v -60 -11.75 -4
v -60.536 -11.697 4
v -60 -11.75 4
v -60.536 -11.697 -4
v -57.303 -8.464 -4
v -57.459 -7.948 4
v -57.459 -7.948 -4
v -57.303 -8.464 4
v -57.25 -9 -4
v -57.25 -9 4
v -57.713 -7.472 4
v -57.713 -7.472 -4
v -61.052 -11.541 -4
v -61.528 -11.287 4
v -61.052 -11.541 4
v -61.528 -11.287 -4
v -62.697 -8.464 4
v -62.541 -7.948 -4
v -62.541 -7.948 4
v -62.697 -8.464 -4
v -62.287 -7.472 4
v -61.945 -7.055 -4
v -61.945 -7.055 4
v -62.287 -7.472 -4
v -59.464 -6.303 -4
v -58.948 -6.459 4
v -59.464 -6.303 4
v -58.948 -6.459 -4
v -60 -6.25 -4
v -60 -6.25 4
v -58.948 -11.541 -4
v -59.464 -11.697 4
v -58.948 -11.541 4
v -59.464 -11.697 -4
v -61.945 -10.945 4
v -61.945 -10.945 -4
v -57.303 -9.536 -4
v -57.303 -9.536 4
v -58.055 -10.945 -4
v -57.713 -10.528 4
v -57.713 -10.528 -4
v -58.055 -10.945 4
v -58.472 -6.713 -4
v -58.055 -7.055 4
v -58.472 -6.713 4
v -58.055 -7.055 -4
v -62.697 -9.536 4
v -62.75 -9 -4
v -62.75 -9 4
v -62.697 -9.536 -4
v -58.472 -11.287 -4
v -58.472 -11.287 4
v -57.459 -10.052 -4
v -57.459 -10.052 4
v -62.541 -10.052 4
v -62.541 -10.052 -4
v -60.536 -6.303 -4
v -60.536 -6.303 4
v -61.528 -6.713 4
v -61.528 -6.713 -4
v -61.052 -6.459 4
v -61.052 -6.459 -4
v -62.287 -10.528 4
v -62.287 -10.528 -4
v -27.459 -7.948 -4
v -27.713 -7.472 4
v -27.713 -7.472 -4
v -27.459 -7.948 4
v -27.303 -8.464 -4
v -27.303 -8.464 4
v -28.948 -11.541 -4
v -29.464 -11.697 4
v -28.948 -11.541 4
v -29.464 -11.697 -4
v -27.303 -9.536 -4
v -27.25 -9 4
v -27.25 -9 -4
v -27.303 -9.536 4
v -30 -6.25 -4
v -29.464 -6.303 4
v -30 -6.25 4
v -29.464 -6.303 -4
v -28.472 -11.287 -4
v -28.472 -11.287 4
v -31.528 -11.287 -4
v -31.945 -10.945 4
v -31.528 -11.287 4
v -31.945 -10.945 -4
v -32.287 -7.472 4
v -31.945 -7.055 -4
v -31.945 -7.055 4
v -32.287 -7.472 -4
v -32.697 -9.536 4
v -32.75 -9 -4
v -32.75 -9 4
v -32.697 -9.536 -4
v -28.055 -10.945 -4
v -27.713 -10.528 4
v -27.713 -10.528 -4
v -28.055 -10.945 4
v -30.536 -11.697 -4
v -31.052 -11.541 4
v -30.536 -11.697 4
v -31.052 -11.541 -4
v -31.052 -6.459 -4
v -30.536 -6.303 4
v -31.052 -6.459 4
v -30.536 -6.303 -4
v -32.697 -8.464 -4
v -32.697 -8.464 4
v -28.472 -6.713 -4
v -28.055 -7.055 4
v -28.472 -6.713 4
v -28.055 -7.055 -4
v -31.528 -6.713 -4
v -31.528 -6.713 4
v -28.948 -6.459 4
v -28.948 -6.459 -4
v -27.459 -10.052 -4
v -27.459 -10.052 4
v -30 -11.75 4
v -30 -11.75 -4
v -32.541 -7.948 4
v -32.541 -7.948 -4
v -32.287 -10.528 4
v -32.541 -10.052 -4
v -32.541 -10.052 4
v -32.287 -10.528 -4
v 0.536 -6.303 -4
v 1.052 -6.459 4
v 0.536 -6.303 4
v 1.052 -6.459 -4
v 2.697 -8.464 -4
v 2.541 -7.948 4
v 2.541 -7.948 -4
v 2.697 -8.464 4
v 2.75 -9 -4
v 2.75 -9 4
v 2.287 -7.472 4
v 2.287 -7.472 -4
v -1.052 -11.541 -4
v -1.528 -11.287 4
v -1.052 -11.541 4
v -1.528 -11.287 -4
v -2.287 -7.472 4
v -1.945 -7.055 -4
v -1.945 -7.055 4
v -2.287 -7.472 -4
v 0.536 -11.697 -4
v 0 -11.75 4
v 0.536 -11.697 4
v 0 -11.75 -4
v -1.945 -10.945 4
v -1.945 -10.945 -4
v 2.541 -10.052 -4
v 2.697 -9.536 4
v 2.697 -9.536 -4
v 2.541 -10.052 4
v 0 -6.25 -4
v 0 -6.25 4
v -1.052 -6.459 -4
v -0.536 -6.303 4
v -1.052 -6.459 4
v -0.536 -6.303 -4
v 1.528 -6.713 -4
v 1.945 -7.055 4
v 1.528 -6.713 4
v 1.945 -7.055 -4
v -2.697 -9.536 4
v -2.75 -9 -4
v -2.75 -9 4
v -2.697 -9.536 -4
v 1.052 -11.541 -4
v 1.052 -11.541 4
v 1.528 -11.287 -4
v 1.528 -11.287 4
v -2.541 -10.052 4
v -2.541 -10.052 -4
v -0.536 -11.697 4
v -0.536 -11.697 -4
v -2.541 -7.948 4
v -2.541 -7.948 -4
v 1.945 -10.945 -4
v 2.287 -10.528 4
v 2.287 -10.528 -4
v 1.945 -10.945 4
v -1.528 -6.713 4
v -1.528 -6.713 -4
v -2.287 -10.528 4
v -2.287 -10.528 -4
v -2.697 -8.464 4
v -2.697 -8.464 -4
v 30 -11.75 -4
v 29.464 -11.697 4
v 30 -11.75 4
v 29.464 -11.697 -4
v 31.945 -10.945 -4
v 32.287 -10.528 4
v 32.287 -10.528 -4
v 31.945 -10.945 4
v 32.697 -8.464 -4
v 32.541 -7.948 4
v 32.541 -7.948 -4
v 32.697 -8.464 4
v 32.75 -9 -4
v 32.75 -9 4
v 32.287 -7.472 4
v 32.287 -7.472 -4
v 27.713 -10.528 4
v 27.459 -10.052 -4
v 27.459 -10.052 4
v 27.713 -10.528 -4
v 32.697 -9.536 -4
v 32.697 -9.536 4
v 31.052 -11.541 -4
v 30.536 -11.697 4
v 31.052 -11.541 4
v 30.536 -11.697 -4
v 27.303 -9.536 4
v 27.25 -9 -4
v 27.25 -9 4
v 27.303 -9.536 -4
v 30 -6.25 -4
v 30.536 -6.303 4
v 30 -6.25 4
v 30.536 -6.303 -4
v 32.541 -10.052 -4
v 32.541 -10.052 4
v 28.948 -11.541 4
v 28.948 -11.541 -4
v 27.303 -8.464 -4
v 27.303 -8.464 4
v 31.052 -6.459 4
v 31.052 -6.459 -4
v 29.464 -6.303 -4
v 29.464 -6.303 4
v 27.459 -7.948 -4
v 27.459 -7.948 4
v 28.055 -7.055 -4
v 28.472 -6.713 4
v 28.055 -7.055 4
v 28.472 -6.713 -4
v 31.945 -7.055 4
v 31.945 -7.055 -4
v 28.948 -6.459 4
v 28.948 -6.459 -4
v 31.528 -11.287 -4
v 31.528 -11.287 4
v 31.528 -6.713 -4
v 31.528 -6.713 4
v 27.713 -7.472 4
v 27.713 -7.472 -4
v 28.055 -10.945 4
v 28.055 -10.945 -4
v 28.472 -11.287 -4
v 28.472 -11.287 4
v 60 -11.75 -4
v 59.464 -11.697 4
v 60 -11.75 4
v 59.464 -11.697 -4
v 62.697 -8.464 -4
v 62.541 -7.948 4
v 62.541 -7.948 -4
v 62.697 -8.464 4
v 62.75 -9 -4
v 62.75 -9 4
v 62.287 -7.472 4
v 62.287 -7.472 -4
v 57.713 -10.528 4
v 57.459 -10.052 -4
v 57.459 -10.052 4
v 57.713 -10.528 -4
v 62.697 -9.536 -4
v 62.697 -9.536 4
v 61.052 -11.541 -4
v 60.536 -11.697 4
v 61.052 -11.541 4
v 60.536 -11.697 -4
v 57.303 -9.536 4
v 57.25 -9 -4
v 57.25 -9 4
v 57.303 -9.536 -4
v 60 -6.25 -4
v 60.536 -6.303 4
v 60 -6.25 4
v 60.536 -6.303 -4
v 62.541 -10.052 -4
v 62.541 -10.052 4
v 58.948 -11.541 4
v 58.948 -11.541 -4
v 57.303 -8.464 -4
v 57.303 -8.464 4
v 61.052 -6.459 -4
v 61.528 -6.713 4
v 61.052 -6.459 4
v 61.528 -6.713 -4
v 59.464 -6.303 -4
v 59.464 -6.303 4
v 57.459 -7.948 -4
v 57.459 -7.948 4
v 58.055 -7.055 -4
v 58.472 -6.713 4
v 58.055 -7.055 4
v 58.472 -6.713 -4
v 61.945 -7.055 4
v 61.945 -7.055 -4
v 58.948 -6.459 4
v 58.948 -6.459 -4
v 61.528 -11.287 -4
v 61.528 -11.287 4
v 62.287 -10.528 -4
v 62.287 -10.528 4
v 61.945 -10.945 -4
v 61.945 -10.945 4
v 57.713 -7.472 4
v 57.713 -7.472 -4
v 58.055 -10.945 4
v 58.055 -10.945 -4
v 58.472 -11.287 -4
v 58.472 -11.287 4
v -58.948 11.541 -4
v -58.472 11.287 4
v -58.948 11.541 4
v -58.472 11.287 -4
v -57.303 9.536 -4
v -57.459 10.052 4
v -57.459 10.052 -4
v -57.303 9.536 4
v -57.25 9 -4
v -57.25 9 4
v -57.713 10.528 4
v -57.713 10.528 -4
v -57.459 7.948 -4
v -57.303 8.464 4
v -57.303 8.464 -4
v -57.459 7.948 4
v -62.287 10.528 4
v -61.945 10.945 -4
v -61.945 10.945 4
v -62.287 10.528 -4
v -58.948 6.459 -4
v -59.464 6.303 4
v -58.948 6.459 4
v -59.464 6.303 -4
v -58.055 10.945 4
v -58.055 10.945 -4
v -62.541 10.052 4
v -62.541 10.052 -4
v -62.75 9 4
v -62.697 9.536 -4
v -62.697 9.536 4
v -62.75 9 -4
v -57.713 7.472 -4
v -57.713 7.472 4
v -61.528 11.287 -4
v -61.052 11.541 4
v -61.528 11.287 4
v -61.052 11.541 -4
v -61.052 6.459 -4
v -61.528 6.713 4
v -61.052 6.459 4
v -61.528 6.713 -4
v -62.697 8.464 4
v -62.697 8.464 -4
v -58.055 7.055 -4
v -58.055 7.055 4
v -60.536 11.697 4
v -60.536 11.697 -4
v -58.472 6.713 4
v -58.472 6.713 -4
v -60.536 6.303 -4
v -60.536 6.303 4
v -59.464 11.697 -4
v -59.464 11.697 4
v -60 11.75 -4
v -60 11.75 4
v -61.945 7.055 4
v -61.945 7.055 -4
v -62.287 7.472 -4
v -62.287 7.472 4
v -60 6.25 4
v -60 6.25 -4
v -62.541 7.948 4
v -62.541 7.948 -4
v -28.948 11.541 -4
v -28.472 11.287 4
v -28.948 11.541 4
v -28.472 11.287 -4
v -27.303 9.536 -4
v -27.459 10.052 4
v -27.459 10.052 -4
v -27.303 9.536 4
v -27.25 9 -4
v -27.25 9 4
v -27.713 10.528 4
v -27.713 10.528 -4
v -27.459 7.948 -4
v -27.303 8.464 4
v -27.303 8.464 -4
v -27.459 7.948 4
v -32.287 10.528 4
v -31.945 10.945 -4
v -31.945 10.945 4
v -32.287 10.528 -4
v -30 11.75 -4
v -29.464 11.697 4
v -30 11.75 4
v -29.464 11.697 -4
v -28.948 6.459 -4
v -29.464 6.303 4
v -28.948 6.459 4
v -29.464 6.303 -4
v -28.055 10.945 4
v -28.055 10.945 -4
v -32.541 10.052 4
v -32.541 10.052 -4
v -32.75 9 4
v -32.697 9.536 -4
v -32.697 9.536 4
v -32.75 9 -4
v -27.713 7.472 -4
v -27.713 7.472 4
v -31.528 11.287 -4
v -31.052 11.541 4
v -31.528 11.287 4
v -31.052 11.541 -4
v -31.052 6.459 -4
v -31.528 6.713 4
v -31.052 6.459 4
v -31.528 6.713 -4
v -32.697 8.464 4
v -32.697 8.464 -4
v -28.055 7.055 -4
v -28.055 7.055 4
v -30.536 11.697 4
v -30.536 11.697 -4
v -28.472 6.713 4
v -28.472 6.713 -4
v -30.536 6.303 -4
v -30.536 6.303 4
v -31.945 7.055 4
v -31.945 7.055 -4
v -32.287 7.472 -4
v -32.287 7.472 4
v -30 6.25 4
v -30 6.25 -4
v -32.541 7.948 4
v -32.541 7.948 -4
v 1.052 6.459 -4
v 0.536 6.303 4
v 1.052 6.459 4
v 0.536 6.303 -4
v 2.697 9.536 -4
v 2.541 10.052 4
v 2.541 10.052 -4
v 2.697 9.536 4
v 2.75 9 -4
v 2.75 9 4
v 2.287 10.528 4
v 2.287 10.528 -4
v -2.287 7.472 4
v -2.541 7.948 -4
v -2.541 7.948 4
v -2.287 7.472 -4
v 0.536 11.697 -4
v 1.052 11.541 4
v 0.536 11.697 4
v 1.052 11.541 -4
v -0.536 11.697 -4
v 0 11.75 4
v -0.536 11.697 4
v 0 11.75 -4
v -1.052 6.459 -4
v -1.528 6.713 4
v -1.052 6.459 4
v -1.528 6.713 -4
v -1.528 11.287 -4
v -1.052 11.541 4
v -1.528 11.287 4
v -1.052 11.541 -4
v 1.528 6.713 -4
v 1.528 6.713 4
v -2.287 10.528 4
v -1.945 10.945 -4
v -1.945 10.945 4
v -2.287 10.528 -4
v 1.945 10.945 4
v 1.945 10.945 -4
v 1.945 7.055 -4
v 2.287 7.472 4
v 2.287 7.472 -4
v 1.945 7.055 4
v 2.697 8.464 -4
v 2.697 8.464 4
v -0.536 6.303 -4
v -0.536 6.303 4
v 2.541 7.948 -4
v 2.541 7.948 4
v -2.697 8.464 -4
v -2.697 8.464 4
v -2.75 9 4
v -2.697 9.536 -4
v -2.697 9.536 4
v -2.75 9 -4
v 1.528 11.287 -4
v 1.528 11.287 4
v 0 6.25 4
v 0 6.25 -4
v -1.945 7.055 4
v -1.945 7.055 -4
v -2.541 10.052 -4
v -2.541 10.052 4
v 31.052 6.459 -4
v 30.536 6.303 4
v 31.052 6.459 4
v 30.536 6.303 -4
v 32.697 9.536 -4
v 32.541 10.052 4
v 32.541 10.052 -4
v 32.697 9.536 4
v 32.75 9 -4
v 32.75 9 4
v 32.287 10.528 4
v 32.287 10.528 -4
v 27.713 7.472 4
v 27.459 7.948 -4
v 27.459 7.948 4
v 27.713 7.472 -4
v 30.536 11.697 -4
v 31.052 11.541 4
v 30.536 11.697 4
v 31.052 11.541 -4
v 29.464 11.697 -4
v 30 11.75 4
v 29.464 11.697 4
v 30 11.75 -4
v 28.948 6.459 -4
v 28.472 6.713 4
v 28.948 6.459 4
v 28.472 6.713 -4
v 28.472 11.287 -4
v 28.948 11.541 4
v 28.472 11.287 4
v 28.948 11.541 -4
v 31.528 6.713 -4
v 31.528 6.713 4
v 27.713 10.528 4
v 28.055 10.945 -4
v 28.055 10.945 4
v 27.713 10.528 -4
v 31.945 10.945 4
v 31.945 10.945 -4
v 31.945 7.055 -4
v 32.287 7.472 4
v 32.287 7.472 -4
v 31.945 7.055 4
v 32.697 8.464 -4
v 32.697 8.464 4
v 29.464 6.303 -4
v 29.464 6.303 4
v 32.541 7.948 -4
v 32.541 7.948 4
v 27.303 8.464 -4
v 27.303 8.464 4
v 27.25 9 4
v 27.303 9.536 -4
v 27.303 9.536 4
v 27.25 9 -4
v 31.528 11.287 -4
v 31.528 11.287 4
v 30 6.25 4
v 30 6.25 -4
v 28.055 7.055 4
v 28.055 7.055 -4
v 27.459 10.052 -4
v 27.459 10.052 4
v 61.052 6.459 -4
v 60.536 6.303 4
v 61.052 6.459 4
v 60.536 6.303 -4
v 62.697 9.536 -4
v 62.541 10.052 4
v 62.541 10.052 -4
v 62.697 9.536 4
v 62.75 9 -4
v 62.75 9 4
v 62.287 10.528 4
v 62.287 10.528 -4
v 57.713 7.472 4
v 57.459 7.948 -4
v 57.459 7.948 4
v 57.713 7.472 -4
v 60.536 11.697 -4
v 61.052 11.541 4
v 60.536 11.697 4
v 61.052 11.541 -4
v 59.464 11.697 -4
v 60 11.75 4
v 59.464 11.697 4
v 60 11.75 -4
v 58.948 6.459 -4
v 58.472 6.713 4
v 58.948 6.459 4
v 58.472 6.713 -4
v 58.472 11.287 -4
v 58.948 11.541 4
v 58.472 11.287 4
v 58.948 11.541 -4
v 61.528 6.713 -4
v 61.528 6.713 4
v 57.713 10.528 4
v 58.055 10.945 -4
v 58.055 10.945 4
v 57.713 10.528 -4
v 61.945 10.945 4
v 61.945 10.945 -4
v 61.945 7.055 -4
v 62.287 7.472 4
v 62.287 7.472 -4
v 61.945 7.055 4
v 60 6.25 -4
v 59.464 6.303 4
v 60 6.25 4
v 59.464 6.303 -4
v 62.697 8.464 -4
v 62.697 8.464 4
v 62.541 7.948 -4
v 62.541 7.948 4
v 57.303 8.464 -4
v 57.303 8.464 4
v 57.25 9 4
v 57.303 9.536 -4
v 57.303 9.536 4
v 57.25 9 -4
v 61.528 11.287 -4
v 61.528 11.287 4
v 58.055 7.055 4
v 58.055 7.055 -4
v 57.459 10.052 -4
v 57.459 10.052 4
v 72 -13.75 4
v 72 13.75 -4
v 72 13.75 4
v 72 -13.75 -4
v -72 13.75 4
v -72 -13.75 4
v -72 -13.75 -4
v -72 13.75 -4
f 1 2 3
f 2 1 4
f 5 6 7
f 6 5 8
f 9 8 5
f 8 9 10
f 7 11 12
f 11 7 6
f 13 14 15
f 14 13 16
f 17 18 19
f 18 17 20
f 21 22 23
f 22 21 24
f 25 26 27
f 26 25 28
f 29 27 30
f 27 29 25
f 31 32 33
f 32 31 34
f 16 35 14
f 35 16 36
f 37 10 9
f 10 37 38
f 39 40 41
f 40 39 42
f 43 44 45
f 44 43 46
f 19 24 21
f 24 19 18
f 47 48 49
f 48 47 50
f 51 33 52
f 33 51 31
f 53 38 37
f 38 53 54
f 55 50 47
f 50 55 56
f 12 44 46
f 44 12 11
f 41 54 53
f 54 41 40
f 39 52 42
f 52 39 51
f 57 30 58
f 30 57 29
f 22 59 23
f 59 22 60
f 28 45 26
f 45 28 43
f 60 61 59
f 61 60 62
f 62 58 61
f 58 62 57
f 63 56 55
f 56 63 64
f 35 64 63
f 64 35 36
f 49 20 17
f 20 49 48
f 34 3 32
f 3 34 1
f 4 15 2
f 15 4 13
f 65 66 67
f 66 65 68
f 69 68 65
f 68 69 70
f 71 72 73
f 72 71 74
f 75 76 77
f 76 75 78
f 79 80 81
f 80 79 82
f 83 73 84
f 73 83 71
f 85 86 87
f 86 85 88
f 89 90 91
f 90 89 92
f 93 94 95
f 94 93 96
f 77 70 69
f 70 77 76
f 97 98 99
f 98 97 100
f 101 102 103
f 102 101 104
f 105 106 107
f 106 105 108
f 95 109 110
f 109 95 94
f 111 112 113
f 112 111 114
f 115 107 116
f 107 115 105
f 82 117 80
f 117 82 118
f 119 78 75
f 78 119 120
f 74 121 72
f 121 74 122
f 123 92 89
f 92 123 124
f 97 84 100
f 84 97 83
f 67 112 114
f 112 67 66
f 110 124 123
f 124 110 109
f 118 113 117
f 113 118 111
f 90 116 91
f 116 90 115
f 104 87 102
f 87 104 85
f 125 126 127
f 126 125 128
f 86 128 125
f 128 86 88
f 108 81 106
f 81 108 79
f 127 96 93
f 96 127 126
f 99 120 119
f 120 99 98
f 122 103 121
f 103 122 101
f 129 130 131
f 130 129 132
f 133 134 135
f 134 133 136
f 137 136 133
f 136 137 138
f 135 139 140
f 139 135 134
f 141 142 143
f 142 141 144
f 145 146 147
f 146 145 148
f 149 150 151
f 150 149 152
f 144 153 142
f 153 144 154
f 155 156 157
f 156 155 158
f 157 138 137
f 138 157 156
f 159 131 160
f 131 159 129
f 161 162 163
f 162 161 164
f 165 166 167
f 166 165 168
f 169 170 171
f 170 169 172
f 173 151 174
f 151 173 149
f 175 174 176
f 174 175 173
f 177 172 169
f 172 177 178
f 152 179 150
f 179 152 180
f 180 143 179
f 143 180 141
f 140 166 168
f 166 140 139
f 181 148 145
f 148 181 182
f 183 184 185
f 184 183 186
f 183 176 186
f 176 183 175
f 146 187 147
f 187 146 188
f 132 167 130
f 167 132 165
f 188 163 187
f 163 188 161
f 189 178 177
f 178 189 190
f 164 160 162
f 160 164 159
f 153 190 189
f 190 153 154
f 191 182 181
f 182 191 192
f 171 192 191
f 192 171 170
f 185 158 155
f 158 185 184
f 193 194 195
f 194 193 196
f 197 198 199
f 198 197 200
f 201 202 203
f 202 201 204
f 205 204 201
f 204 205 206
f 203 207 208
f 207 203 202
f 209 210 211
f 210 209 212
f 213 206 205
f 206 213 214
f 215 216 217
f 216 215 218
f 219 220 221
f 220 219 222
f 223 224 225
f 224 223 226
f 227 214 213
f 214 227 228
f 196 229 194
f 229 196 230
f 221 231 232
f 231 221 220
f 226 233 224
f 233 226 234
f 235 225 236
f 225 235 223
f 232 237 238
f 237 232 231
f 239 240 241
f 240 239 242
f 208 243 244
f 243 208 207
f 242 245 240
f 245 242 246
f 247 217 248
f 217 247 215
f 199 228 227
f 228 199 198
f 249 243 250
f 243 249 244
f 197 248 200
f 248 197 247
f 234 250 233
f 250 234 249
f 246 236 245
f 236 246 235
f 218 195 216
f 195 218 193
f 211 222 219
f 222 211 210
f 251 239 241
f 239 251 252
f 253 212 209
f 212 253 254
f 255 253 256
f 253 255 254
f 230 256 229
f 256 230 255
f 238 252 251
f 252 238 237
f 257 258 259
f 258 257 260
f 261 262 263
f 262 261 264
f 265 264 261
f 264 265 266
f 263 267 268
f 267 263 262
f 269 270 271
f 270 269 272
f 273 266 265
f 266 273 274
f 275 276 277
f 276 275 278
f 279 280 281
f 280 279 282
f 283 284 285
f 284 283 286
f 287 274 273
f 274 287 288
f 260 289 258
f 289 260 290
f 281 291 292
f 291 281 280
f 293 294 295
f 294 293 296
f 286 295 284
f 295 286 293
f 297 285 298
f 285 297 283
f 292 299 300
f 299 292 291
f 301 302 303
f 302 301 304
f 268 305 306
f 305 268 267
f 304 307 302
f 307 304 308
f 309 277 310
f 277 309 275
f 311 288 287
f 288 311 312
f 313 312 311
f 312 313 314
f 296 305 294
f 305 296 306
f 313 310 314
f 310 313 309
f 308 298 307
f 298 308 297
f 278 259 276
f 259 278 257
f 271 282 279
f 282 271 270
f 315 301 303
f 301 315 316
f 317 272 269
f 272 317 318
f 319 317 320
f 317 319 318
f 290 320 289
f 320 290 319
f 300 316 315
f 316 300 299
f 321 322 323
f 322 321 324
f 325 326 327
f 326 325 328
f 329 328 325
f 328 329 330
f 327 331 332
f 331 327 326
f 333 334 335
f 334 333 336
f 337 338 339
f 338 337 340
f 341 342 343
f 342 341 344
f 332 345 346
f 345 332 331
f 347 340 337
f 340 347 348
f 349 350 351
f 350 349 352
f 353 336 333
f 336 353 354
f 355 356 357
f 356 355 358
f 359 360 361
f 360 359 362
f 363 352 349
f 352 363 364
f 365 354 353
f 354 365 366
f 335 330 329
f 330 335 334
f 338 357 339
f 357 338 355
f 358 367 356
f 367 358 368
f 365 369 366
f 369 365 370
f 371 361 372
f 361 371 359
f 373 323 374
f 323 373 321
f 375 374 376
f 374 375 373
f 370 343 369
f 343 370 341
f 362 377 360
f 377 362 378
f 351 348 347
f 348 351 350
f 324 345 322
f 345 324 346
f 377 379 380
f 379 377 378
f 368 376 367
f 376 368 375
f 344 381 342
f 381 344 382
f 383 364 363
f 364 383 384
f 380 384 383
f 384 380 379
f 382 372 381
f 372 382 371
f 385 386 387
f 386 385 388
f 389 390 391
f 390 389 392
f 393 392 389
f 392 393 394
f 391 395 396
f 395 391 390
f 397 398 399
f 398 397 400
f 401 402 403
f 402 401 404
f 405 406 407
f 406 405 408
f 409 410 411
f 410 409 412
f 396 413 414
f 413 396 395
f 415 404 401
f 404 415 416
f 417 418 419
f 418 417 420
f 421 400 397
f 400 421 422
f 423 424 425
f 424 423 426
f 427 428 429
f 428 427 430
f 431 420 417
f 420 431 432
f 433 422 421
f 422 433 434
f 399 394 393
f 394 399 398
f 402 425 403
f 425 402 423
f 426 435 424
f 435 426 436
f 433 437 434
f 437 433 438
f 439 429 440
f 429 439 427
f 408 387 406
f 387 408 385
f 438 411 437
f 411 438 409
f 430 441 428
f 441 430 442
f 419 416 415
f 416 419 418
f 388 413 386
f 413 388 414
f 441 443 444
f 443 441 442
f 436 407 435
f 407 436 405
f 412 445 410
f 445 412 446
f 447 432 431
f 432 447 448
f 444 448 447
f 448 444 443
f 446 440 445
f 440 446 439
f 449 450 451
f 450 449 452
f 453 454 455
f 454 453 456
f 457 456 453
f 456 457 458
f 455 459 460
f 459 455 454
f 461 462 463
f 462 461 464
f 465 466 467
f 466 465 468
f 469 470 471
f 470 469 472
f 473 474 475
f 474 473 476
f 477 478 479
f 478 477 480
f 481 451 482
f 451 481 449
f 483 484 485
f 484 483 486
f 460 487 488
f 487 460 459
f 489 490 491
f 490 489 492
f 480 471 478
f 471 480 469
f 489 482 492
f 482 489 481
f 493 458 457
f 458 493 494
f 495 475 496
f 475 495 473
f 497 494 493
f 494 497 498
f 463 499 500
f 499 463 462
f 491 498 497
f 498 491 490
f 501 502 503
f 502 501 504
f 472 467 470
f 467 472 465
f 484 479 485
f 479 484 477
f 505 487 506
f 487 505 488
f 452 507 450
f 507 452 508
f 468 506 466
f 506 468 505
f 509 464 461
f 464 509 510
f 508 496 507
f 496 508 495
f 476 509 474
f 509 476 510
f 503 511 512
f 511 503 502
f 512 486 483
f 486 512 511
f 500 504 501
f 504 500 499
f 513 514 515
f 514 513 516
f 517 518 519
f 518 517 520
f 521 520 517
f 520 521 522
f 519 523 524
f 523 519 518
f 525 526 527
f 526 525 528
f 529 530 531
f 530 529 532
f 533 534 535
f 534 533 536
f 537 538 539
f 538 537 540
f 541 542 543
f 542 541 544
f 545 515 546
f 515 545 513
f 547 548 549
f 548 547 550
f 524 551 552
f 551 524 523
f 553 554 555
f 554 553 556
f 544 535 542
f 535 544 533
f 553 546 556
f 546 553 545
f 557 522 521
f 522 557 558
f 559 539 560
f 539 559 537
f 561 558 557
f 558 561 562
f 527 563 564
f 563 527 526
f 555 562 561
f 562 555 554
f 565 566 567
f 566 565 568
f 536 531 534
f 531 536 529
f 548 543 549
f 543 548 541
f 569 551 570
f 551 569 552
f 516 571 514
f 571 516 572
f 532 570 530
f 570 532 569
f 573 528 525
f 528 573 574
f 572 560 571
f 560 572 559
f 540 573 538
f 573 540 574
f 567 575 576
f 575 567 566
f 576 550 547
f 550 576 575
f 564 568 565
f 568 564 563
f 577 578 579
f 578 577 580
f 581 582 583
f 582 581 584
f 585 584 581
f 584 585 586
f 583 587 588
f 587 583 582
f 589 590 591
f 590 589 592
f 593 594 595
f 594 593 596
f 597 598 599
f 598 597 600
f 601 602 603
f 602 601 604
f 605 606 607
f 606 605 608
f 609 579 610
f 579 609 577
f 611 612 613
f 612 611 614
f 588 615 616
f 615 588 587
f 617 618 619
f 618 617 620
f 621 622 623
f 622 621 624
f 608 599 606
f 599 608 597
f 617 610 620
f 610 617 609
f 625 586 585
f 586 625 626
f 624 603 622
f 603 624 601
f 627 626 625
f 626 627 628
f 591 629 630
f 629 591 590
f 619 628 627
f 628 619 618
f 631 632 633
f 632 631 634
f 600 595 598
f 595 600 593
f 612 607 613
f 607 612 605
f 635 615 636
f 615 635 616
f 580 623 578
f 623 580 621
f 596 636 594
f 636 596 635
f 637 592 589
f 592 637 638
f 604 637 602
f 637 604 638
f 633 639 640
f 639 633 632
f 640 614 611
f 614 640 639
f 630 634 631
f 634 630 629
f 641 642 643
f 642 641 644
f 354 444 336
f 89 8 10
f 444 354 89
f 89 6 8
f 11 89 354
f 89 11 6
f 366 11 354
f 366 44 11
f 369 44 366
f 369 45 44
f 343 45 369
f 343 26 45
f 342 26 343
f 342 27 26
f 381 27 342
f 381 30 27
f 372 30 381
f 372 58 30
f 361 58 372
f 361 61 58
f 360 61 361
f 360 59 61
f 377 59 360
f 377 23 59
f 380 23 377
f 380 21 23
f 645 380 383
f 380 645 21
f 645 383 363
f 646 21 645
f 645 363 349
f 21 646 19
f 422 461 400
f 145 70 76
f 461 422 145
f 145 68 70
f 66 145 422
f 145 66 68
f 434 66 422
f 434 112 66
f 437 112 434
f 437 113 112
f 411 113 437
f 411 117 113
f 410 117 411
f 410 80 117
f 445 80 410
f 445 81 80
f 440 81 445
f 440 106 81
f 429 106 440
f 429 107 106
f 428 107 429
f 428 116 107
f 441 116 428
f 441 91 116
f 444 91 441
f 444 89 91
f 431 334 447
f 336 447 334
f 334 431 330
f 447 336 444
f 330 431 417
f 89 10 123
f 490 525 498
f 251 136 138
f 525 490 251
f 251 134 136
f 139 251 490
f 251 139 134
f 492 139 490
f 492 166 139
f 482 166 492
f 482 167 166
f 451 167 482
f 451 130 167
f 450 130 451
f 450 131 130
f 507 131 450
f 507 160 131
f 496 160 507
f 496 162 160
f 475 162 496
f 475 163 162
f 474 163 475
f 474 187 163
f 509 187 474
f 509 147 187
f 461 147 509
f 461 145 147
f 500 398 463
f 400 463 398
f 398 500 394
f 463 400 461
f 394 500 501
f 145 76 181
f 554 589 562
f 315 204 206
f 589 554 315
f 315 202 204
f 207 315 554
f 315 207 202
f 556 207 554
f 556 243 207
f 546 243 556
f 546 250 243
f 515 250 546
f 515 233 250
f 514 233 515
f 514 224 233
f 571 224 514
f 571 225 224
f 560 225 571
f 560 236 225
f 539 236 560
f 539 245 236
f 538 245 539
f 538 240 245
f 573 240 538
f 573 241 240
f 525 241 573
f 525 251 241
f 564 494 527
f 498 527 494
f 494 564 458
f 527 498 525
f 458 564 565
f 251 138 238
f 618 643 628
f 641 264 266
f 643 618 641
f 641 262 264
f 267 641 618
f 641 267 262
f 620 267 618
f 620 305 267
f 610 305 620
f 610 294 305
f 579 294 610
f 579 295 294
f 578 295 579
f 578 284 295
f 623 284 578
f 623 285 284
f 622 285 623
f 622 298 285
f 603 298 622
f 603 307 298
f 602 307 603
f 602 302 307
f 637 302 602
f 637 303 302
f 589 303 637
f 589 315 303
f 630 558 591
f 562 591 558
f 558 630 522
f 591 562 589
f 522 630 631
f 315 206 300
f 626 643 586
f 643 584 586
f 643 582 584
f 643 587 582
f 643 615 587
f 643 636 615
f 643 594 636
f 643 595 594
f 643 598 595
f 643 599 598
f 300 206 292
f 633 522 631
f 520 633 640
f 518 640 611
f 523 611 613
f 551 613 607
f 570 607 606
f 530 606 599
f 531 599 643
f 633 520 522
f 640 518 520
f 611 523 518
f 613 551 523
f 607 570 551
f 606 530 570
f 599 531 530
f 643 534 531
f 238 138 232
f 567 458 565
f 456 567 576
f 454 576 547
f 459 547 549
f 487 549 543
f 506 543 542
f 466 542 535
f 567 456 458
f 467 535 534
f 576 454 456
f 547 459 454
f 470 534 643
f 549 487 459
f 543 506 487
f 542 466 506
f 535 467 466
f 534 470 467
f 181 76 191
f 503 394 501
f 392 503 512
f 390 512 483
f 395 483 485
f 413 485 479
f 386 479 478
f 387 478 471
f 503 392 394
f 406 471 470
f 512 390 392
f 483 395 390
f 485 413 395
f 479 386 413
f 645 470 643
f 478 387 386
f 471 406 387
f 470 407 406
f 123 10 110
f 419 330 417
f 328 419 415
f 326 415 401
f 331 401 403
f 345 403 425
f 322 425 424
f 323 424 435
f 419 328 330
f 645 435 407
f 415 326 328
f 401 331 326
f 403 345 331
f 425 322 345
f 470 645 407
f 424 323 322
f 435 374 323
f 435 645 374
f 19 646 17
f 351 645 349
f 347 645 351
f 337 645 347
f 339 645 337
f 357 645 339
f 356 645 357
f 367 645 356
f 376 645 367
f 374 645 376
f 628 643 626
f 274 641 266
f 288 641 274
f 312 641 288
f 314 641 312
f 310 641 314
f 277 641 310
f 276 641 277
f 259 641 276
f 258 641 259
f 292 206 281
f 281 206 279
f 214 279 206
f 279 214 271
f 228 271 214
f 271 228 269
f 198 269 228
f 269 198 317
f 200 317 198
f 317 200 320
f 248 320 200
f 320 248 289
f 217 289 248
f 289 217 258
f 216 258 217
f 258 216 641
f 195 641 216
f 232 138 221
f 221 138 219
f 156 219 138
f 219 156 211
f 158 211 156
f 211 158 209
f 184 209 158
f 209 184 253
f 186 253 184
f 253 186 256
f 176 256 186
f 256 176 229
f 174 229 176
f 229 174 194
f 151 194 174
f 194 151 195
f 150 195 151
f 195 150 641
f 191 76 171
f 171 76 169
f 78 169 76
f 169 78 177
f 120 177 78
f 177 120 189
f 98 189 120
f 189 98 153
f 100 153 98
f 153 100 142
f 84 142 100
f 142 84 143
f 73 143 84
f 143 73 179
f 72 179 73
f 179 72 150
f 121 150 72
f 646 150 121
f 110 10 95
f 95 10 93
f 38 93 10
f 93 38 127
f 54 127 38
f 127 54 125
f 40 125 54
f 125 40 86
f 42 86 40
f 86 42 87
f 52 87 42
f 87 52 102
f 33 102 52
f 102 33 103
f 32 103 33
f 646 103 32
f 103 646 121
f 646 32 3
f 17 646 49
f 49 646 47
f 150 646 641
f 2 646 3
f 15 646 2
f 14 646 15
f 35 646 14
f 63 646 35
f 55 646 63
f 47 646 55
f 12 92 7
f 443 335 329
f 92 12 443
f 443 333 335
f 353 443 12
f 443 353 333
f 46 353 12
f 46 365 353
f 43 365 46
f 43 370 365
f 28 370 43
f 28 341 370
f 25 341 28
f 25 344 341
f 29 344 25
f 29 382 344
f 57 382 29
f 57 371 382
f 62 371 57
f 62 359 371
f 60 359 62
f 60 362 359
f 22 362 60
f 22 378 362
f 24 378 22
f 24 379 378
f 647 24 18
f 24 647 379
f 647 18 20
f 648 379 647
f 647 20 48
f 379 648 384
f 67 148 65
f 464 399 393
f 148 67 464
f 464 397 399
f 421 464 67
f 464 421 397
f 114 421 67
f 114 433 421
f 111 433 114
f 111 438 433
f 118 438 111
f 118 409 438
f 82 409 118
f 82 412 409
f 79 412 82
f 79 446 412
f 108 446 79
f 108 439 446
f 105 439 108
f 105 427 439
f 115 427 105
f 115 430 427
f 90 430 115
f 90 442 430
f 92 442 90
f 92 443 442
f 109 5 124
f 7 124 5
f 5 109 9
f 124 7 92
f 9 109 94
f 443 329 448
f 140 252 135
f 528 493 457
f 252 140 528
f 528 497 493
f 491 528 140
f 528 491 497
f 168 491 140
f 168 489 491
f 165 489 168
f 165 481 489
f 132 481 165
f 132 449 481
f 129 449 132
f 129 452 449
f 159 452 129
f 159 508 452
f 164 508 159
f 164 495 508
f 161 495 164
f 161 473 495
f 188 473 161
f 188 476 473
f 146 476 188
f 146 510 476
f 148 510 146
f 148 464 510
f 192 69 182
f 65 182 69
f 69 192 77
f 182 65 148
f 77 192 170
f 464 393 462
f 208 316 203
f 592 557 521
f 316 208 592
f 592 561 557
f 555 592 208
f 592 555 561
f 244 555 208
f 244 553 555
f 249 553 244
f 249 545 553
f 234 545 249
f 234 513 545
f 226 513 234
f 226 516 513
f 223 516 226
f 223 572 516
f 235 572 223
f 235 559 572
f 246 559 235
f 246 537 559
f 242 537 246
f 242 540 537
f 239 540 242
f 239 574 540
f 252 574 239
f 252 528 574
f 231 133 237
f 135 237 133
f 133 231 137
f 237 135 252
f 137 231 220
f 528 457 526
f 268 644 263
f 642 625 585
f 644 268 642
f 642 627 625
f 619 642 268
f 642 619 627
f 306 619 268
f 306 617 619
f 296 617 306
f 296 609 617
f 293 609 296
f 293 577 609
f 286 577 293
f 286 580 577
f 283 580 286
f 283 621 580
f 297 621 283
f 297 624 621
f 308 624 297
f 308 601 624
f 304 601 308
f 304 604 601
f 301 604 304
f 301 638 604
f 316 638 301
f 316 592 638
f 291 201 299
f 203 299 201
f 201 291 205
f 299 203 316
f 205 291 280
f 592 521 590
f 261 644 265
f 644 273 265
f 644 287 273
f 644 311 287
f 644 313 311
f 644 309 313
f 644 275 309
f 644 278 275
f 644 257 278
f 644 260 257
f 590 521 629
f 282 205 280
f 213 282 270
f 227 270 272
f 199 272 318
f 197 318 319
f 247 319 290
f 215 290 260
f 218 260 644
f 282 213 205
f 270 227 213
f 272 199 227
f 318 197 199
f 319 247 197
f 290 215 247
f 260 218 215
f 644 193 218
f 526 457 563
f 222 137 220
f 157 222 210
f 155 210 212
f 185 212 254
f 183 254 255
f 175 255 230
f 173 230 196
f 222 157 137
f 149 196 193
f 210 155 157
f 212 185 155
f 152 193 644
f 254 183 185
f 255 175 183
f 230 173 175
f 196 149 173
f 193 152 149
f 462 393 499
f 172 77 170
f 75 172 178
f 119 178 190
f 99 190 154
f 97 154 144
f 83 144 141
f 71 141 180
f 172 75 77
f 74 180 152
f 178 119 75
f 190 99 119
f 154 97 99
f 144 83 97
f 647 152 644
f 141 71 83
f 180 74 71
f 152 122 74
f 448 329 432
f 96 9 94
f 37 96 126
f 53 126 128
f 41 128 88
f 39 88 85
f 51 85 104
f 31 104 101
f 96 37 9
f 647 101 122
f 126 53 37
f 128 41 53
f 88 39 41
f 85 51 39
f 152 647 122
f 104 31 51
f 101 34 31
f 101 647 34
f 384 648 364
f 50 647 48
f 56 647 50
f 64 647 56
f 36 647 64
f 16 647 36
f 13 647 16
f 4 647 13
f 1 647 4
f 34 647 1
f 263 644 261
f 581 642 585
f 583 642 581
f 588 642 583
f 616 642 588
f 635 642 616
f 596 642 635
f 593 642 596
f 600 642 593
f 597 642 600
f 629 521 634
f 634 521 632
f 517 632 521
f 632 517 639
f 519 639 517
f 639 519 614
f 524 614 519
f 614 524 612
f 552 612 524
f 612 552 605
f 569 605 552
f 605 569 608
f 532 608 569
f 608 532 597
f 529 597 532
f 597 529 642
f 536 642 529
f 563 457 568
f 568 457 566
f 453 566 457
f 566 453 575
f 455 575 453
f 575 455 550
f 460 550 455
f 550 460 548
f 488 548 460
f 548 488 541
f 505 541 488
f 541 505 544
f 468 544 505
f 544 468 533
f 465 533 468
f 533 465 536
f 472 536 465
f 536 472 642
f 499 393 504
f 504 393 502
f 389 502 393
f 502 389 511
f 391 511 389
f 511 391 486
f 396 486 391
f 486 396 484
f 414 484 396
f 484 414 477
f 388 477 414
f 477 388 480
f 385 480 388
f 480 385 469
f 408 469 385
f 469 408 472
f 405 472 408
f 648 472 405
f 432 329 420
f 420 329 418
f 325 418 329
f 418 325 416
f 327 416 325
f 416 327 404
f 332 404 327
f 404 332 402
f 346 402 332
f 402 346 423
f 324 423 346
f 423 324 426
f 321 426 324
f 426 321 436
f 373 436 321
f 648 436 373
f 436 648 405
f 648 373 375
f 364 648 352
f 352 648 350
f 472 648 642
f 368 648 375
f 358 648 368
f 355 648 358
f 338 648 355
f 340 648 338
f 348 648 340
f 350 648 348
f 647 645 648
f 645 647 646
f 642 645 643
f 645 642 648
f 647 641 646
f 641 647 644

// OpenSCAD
$fn = 32;

// ----------------------------------------------------------------------
// Hole bar, 5 x Ø5.5
// tworows layout, 12 mm edge offset
// ----------------------------------------------------------------------

// --- parameters (mm) ---
bar_w = 27.5;     // bar width (Y)
bar_t = 8;        // bar thickness (Z)
holes = 5;        // holes per row
hole_d = 5.5;     // hole diameter
edge = 12;        // offset from the bar end to the first hole
pitch = 30;       // pitch between neighbouring holes
row_offset = 18;  // distance between the two rows

// --- derived feature positions (mm) ---
span = (holes - 1) * pitch;   // = 120   distance between the end holes
bar_l = span + 2 * edge;      // = 144   overall bar length
start_x = -bar_l / 2 + edge;  // = -60   X of the first hole
feature_centers = [
  [start_x + 0 * pitch, -row_offset / 2],
  [start_x + 1 * pitch, -row_offset / 2],
  [start_x + 2 * pitch, -row_offset / 2],
  [start_x + 3 * pitch, -row_offset / 2],
  [start_x + 4 * pitch, -row_offset / 2]
];   // hole centres of the first row
row2_centers = [
  [start_x + 0 * pitch, row_offset / 2],
  [start_x + 1 * pitch, row_offset / 2],
  [start_x + 2 * pitch, row_offset / 2],
  [start_x + 3 * pitch, row_offset / 2],
  [start_x + 4 * pitch, row_offset / 2]
];   // hole centres of the second row

// bar with two rows of holes, both read from their own centre arrays
difference() {
  translate([-bar_l / 2, -bar_w / 2, -bar_t / 2]) cube([bar_l, bar_w, bar_t]);
  for (centre = feature_centers)
    translate([centre[0], centre[1], 0])
      cylinder(d = hole_d, h = bar_t + 2, center = true);
  for (centre = row2_centers)
    translate([centre[0], centre[1], 0])
      cylinder(d = hole_d, h = bar_t + 2, center = true);
}
